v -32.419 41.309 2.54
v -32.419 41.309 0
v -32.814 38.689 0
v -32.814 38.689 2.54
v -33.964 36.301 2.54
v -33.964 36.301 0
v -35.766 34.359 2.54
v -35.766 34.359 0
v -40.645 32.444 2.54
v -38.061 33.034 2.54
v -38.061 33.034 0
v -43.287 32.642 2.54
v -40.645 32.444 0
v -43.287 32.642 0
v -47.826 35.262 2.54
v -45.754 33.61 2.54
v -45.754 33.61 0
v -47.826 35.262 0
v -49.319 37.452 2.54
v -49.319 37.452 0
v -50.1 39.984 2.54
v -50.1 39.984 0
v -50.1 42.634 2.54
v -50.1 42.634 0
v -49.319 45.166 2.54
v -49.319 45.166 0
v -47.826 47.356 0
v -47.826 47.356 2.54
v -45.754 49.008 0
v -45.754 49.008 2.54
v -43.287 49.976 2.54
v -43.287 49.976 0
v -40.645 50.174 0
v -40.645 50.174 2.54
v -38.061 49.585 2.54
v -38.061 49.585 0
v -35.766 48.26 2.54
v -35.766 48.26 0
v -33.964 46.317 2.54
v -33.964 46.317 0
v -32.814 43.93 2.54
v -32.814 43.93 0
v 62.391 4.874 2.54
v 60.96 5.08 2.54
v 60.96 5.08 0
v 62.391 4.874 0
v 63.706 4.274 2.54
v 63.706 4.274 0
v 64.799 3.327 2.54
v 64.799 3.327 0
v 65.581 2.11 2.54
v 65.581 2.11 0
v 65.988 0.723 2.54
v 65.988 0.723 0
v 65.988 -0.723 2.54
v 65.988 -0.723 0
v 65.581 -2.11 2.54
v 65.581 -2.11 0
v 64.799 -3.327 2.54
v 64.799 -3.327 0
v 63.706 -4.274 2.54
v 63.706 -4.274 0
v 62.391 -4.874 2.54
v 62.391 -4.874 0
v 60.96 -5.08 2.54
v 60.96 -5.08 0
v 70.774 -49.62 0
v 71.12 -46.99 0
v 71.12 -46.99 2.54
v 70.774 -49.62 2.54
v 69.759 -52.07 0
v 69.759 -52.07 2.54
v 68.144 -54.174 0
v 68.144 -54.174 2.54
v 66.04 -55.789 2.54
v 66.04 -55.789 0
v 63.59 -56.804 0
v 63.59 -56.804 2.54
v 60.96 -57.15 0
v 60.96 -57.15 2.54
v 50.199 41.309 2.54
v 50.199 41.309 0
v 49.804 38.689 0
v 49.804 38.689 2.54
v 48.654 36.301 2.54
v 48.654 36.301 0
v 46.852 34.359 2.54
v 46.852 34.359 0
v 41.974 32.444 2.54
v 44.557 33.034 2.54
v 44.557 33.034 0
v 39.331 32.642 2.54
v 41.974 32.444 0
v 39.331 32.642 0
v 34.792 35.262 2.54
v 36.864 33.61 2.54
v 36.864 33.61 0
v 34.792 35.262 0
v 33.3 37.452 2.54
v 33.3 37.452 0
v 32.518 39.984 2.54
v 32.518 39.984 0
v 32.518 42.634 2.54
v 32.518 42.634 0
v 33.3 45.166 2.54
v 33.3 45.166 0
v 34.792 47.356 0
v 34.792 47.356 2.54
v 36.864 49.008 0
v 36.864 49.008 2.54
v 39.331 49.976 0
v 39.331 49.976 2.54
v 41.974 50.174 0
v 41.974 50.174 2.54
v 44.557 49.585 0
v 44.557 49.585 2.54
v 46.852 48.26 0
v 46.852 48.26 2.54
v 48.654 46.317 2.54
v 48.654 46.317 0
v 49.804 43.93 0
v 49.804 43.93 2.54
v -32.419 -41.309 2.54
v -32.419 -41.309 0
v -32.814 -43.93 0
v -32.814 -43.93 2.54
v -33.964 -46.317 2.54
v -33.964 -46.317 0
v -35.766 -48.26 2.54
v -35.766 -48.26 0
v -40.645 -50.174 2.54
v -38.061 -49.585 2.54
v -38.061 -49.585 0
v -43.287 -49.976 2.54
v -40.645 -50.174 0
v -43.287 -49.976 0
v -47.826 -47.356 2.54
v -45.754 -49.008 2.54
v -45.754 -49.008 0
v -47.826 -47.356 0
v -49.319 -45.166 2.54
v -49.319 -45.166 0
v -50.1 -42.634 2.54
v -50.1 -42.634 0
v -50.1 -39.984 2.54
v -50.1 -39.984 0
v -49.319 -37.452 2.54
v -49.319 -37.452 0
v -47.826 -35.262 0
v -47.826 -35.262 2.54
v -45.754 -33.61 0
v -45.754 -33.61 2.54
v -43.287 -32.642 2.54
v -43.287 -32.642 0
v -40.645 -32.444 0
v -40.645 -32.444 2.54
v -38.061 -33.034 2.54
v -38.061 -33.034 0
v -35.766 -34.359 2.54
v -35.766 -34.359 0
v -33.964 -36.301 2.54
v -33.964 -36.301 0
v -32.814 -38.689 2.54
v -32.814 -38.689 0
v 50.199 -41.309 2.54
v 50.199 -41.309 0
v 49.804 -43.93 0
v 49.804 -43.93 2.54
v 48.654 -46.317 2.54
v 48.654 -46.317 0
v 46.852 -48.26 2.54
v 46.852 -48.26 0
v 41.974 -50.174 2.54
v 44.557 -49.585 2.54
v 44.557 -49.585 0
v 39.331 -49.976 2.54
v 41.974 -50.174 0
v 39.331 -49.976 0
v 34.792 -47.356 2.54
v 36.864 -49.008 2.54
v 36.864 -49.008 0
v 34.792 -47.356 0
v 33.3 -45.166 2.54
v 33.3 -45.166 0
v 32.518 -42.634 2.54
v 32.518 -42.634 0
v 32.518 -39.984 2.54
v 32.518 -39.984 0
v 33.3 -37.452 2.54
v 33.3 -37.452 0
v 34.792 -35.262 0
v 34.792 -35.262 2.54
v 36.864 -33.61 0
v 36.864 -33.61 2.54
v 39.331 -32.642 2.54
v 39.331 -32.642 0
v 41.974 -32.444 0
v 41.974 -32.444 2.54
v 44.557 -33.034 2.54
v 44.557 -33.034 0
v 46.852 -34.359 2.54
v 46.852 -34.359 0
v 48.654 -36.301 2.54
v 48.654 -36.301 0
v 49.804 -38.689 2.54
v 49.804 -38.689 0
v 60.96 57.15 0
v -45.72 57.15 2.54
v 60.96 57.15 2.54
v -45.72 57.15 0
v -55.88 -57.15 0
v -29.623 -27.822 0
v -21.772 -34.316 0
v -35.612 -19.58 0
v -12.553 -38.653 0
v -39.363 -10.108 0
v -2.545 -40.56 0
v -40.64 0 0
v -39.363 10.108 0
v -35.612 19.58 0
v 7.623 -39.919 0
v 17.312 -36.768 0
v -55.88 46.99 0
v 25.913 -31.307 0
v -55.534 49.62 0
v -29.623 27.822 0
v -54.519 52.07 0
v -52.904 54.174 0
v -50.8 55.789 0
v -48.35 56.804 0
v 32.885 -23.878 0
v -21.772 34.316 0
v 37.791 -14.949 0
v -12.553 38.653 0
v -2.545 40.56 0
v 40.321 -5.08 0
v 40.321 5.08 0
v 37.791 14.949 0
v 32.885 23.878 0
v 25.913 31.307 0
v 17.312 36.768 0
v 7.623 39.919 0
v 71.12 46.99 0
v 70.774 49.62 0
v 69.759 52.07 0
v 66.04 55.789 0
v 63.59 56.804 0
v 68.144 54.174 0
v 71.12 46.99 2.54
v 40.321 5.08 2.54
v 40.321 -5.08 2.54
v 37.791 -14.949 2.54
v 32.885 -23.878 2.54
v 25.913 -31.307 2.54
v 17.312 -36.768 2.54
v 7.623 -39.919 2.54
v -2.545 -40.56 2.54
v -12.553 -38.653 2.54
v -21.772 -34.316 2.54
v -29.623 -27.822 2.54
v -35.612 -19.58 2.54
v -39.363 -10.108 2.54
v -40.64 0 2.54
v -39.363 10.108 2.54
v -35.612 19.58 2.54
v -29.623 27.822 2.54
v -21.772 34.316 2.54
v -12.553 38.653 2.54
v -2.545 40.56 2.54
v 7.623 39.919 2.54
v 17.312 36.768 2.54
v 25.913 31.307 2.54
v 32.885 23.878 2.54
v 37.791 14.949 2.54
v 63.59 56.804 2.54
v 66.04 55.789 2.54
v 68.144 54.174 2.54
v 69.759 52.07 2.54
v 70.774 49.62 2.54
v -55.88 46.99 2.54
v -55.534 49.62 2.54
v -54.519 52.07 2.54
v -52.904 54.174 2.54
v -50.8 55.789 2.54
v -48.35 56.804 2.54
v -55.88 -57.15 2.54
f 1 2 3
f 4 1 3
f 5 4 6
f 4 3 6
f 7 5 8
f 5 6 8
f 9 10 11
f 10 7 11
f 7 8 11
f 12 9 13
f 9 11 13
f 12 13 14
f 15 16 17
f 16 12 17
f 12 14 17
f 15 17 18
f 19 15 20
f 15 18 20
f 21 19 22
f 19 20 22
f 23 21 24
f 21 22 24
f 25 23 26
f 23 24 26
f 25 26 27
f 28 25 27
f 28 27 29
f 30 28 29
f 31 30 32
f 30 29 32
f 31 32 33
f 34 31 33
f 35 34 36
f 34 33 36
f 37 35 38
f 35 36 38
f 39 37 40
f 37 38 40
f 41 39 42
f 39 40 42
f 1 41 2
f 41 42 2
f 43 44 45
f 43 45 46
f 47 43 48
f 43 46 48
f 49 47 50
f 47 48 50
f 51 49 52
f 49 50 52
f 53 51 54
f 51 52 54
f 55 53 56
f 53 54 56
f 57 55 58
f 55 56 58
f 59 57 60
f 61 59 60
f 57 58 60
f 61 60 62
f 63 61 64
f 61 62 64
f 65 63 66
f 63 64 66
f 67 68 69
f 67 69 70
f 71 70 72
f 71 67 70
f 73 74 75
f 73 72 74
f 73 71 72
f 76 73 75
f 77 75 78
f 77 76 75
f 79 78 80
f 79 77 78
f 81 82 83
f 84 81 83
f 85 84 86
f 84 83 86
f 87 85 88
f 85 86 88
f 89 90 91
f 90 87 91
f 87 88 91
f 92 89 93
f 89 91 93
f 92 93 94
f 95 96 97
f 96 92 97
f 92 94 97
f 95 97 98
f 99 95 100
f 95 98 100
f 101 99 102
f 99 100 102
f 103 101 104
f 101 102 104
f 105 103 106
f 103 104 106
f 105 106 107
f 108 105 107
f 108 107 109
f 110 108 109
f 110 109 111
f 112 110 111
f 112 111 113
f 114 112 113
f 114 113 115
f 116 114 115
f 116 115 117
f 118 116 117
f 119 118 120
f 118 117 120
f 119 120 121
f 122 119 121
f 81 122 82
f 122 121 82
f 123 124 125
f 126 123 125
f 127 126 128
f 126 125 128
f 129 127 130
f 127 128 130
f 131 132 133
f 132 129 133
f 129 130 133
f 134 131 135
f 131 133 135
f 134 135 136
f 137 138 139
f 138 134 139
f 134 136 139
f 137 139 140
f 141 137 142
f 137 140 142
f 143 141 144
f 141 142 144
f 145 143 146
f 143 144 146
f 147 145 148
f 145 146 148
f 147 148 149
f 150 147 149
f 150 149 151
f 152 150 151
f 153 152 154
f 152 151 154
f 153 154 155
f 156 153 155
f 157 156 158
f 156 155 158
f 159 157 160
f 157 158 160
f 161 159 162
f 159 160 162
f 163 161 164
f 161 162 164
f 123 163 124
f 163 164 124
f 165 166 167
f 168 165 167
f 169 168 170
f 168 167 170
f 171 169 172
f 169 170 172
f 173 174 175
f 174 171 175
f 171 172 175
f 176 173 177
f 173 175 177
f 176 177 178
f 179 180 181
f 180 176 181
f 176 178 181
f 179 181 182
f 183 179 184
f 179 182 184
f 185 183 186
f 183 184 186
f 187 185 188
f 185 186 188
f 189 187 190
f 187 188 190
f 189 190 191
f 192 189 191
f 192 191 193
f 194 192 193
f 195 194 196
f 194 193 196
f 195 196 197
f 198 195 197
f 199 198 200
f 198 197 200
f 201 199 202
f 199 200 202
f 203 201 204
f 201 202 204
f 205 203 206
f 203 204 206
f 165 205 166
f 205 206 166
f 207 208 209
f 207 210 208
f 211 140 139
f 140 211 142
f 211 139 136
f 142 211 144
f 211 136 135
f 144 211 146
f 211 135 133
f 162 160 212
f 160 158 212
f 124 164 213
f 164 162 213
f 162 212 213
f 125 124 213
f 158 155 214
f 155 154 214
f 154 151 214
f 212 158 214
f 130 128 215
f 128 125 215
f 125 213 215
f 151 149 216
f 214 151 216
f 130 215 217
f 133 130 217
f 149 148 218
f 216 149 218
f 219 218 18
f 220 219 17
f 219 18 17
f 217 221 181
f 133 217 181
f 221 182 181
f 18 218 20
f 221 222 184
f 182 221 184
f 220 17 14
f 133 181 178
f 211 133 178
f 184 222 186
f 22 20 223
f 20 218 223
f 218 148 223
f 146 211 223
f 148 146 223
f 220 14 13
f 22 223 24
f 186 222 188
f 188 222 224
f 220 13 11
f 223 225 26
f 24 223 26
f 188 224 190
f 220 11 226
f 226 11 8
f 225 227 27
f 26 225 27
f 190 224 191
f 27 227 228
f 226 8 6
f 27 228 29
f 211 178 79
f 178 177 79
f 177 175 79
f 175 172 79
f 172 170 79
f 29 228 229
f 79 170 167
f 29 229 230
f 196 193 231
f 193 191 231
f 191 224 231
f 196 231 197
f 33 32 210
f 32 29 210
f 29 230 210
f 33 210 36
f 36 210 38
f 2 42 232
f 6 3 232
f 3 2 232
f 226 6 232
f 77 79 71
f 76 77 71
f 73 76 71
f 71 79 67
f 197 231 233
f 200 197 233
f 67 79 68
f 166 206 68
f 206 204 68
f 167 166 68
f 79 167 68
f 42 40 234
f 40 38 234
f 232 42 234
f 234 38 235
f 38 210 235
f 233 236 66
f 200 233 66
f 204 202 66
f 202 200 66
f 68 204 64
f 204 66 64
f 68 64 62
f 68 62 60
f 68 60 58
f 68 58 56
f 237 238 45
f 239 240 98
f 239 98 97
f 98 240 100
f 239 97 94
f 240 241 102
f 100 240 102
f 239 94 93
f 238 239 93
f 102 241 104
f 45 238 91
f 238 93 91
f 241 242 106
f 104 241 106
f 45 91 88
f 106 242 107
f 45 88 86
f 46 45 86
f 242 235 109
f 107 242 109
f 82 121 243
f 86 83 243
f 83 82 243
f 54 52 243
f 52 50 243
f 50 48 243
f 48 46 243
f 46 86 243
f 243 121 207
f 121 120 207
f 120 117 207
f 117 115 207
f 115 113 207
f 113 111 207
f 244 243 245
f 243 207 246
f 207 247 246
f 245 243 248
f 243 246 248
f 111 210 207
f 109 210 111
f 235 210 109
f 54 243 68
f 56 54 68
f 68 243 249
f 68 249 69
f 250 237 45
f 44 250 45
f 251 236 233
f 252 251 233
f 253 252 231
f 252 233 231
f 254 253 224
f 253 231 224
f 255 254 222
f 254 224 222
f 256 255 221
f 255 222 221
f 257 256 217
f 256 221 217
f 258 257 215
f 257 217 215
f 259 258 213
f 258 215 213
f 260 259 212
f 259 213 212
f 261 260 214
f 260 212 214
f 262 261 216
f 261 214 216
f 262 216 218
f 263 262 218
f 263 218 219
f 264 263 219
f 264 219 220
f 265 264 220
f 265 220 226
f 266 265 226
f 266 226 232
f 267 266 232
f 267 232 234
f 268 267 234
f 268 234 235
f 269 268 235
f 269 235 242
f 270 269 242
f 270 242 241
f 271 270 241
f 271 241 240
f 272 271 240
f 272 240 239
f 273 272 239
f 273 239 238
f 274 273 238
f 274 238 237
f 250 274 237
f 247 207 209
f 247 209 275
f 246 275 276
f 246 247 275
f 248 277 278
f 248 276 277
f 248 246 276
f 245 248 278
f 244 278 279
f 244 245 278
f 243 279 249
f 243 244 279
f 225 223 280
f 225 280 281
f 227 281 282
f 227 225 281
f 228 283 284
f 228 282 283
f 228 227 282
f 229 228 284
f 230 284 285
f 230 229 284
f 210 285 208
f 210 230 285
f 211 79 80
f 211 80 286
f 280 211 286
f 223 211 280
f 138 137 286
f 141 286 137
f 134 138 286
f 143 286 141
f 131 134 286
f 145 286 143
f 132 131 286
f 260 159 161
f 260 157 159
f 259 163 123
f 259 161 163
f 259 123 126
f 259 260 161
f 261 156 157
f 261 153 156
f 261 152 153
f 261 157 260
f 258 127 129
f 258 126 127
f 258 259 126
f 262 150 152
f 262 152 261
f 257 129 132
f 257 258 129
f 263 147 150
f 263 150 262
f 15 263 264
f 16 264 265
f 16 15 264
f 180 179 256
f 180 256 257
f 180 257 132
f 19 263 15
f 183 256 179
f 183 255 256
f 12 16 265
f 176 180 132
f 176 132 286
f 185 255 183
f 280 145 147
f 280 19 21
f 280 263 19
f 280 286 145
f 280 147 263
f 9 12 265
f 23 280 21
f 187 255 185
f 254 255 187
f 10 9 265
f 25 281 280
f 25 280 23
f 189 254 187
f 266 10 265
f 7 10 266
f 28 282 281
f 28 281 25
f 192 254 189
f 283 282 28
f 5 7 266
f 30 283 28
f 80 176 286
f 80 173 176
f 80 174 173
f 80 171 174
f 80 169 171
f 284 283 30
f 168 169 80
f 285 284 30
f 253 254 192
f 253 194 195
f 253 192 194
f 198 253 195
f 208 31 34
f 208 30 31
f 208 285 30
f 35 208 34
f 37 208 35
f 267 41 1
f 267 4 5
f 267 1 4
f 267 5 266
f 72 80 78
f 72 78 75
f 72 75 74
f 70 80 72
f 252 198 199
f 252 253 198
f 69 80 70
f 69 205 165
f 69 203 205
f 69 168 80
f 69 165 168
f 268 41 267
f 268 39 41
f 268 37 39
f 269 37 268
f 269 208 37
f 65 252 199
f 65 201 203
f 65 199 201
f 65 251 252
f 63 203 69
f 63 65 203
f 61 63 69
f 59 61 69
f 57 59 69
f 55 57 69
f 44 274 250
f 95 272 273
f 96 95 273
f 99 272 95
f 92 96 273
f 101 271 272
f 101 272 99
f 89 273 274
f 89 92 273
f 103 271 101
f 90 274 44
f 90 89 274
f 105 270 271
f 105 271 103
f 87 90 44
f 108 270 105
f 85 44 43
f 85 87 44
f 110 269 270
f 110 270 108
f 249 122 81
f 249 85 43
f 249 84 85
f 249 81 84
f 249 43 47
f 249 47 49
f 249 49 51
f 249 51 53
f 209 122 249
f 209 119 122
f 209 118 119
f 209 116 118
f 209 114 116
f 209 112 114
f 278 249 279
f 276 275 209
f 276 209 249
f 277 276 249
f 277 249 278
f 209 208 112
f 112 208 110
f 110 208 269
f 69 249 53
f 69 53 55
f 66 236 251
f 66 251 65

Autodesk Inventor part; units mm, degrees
ref_plane "YZ Plane" through (0, 0, 0) normal (1, 0, 0) x (0, 1, 0)
ref_plane "XZ Plane" through (0, 0, 0) normal (0, 1, 0) x (-1, 0, 0)
ref_plane "XY Plane" through (0, 0, 0) normal (0, 0, 1) x (1, 0, 0)
sketch "Sketch1" plane through (0, 0, 0) normal (0, 0, 1) x (1, 0, 0)
  line L0 (-45.72, 57.15) -> (60.96, 57.15)
  line L1 (71.12, 46.99) -> (71.12, -46.99)
  line L2 (60.96, -57.15) -> (-55.88, -57.15)
  line L3 (-55.88, -57.15) -> (-55.88, 46.99)
  line L4 (-84.7488, 0) -> (99.553, 0) projected
  line L5 (0, -82.9559) -> (0, 82.9559) projected
  arc A0 (40.3212, 5.08) -> (40.3212, -5.08) centre (0, 0) ccw
  circle A1 centre (0, 0) radius 58.42 construction
  arc A2 (-45.72, 57.15) -> (-55.88, 46.99) centre (-45.72, 46.99) ccw
  arc A3 (71.12, 46.99) -> (60.96, 57.15) centre (60.96, 46.99) ccw
  arc A4 (60.96, -57.15) -> (71.12, -46.99) centre (60.96, -46.99) ccw
  line L6 (0, 0) -> (-50.4247, 50.4247) construction
  circle A5 centre (-41.3092, 41.3092) radius 8.89
  line L7 (0, 0) -> (-50.4247, -50.4247) construction
  circle A6 centre (-41.3092, -41.3092) radius 8.89
  line L8 (0, 0) -> (50.4247, -50.4247) construction
  circle A7 centre (41.3092, -41.3092) radius 8.89
  line L9 (0, 0) -> (50.4247, 50.4247) construction
  circle A8 centre (41.3092, 41.3092) radius 8.89
  arc A9 (60.96, -5.08) -> (60.96, 5.08) centre (60.96, 0) ccw
  line L10 (40.3212, 5.08) -> (60.96, 5.08)
  line L11 (40.3212, -5.08) -> (60.96, -5.08)
  point P0 (71.12, -57.15)
  point P1 (71.12, 57.15)
  point P2 (71.12, 0)
  dimension "d4" = 116.84
  dimension "d0" = 127
  dimension "d1" = 114.3
  dimension "d2" = 55.88
  dimension "d3" = 81.28
  dimension "d5" = 10.16
  dimension "d6" = 45
  dimension "d7" = 17.78
  dimension "d10" = 360
  dimension "d12" = 10.16
  dimension "d13" = 10.16
  dimension "d14" = 60.96
extrude "Extrusion1" add sketch "Sketch1" along normal blind 2.54 contours L0 L5 A0 L4 L3 A2 | L0 A3 L1 L4 A9 L10 A0 L5 | L4 A0 L5 L2 L3 | L1 A4 L2 L5 A0 L11 A9 L4
equation "\"BendRadius\" = Thickness"
equation "\"BendReliefWidth\" = Thickness"
equation "\"BendReliefDepth\" = 0.5 * Thickness"
equation "\"CornerReliefSize\" = 4 * Thickness"
equation "\"MinimumRemnant\" = 2 * Thickness"
equation "\"TransitionRadius\" = BendRadius"
equation "\"JacobiRadiusSize\" = BendRadius"
equation "\"GapSize\" = Thickness"
equation "\"Thickness\" = 3.048"
properties part number "cylinder head gasket" material "Rubber"
